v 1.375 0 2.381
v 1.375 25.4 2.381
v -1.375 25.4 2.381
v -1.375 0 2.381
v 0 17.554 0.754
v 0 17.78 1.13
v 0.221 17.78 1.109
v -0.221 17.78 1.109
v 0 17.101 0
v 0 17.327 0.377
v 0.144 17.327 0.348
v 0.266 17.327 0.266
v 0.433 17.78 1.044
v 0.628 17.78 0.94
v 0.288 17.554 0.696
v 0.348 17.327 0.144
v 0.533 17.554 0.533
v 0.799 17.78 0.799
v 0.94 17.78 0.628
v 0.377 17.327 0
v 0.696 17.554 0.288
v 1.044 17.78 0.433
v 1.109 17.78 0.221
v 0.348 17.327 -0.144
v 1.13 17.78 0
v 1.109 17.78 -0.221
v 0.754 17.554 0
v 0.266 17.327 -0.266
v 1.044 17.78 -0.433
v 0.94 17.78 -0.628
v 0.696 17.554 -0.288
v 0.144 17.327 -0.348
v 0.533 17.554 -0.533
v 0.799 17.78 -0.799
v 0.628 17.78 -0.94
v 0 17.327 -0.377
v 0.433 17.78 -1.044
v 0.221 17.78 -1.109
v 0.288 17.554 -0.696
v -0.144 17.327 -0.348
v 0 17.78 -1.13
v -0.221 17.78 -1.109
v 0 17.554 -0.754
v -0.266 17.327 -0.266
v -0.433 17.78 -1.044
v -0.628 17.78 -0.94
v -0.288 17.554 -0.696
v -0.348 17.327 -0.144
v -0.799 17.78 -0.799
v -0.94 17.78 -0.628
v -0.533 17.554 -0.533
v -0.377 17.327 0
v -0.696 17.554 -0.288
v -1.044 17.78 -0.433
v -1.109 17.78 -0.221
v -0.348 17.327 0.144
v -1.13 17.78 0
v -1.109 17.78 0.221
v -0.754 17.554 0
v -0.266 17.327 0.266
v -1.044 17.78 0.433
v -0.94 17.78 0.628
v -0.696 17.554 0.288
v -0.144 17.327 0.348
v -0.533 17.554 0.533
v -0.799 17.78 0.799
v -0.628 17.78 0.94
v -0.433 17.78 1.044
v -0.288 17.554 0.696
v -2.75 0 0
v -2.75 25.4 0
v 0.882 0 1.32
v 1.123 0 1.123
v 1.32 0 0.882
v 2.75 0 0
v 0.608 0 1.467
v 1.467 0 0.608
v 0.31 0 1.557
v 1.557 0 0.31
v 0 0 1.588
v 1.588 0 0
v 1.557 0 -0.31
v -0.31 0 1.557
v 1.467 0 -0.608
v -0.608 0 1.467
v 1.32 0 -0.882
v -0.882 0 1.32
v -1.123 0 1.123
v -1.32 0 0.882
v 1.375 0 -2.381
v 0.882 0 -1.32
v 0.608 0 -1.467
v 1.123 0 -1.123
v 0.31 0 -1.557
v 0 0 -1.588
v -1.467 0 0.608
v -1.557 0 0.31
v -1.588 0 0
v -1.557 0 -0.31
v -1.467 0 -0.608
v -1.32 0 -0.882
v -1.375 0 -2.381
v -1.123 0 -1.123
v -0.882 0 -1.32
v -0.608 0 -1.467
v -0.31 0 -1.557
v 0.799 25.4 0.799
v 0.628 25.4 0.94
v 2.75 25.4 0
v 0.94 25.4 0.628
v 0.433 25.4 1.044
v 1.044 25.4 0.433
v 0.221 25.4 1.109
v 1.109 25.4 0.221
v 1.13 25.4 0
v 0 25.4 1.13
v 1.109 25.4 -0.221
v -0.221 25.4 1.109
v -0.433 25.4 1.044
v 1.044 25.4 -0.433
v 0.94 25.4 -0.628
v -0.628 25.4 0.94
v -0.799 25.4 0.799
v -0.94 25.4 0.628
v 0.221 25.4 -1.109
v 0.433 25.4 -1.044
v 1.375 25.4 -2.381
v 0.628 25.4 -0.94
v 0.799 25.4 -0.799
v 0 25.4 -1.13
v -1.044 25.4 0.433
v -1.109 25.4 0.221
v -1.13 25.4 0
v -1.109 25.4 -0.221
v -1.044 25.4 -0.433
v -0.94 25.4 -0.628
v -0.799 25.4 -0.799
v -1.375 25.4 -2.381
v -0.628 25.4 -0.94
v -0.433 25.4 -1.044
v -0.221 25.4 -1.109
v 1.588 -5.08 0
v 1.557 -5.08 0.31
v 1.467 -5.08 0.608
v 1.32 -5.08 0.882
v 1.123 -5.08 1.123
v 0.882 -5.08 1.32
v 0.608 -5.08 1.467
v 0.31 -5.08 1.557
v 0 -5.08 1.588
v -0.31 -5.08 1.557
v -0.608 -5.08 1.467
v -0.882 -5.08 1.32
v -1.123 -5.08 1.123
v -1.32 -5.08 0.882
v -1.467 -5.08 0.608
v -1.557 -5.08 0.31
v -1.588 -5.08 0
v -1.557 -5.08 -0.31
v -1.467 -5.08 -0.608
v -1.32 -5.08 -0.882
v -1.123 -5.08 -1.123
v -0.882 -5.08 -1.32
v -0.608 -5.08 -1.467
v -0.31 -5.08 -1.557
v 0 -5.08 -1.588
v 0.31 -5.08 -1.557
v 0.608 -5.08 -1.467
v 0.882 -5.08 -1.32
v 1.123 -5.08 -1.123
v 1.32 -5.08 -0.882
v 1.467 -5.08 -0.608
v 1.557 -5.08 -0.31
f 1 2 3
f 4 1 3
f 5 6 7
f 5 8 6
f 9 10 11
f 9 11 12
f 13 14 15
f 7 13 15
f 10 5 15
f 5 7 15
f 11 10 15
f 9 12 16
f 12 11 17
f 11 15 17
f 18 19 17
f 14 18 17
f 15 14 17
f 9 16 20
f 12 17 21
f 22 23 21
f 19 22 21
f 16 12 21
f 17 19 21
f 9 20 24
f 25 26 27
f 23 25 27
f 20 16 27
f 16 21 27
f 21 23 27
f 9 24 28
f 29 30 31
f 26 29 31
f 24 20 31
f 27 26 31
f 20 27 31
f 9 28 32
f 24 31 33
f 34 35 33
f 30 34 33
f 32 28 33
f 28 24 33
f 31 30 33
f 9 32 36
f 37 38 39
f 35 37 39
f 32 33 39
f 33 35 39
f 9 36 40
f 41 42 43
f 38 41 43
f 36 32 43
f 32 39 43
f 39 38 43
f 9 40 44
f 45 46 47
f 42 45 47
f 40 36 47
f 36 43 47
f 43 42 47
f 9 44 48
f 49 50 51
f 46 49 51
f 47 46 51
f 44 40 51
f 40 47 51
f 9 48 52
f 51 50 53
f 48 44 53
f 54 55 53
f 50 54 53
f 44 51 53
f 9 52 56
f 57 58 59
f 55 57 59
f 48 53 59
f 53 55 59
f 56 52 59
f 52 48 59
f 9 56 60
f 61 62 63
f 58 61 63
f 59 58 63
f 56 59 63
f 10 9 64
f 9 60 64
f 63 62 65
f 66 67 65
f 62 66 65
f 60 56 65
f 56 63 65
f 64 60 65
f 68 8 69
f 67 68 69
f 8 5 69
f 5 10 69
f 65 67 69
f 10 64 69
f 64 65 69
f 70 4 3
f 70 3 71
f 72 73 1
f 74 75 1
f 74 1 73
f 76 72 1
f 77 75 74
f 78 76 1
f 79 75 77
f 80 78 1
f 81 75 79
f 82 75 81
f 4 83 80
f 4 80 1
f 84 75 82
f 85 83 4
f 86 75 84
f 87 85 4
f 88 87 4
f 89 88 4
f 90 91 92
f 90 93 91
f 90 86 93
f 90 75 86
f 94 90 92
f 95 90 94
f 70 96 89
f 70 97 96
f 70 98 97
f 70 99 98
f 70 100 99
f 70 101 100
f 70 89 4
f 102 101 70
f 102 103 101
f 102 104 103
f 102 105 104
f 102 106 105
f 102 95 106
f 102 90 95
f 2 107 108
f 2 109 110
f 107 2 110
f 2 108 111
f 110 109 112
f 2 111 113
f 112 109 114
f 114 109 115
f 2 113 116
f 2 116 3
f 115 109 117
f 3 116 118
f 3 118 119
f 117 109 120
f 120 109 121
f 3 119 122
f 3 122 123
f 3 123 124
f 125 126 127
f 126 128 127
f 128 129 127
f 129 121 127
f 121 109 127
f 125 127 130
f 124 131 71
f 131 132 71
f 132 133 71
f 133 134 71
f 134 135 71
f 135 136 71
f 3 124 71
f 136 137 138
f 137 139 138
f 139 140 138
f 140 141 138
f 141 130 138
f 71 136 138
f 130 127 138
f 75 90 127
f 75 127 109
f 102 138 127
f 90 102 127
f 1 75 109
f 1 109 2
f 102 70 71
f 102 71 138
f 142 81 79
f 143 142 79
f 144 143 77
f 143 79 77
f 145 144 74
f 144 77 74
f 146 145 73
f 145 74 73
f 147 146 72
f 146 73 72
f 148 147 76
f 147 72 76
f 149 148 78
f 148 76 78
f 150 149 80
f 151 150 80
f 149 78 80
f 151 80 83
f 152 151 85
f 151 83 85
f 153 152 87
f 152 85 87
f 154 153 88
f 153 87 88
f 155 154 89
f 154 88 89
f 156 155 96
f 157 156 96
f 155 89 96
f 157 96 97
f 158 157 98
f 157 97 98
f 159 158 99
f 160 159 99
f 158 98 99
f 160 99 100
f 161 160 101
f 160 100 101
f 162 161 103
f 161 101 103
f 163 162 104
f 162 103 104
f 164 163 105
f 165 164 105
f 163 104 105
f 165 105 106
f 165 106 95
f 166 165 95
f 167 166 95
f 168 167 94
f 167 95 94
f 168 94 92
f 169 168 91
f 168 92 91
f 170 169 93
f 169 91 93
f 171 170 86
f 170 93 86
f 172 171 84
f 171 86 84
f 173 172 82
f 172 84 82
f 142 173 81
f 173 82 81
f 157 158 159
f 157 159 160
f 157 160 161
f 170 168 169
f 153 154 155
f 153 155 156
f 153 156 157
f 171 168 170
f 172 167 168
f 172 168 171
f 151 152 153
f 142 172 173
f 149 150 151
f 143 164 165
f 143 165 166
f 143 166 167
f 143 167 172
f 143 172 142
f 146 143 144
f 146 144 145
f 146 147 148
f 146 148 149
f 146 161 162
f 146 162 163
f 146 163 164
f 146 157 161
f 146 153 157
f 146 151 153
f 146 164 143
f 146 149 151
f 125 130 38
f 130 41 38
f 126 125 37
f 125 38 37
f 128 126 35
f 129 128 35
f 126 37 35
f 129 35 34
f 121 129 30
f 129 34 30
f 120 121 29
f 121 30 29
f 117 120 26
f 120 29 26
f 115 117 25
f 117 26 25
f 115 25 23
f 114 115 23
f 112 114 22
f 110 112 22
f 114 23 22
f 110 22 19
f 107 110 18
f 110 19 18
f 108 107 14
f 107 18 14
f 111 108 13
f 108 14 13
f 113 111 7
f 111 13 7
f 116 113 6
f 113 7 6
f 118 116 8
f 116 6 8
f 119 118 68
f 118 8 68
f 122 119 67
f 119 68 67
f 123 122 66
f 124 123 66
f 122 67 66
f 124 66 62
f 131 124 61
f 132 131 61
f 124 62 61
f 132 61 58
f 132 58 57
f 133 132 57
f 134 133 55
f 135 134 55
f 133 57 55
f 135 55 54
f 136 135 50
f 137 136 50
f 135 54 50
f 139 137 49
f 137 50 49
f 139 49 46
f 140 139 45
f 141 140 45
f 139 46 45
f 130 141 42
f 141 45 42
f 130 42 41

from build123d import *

# Parameters (mm, degrees)
EXTRUDE1_DEPTH            = 25.4
F_4_40_TAPPED_HOLE1_D     = 2.2606
F_4_40_TAPPED_HOLE1_DEPTH = 7.62
F_4_40_TAPPED_HOLE1_TIP   = 0.679152758
SKETCH5_R                 = 1.5875
EXTRUDE2_DEPTH            = 5.08


with BuildPart() as part:
    # Sketch1 → Extrude1 (new body)
    with BuildSketch(Plane(origin=(0, 0, 0), x_dir=(1, 0, 0), z_dir=(0, 1, 0))):
        Polygon((-1.374815329, 2.38125), (1.374815329, 2.38125), (2.749630657, 0), (1.374815329, -2.38125), (-1.374815329, -2.38125), (-2.749630657, 0), align=None)
    extrude(amount=EXTRUDE1_DEPTH)

    # #4-40 Tapped Hole1
    with Locations(Plane.ZX.offset(25.4)):
        with Locations((0, 0)):
            Hole(F_4_40_TAPPED_HOLE1_D / 2, depth=F_4_40_TAPPED_HOLE1_DEPTH)
            with Locations((0, 0, -(F_4_40_TAPPED_HOLE1_DEPTH + F_4_40_TAPPED_HOLE1_TIP / 2))):  # 118° drill point
                Cone(0, F_4_40_TAPPED_HOLE1_D / 2, F_4_40_TAPPED_HOLE1_TIP, mode=Mode.SUBTRACT)

    # Sketch5 → Extrude2 (add)
    with BuildSketch(Plane.XZ):
        Circle(SKETCH5_R)
    extrude(amount=EXTRUDE2_DEPTH)


solid = part.part
